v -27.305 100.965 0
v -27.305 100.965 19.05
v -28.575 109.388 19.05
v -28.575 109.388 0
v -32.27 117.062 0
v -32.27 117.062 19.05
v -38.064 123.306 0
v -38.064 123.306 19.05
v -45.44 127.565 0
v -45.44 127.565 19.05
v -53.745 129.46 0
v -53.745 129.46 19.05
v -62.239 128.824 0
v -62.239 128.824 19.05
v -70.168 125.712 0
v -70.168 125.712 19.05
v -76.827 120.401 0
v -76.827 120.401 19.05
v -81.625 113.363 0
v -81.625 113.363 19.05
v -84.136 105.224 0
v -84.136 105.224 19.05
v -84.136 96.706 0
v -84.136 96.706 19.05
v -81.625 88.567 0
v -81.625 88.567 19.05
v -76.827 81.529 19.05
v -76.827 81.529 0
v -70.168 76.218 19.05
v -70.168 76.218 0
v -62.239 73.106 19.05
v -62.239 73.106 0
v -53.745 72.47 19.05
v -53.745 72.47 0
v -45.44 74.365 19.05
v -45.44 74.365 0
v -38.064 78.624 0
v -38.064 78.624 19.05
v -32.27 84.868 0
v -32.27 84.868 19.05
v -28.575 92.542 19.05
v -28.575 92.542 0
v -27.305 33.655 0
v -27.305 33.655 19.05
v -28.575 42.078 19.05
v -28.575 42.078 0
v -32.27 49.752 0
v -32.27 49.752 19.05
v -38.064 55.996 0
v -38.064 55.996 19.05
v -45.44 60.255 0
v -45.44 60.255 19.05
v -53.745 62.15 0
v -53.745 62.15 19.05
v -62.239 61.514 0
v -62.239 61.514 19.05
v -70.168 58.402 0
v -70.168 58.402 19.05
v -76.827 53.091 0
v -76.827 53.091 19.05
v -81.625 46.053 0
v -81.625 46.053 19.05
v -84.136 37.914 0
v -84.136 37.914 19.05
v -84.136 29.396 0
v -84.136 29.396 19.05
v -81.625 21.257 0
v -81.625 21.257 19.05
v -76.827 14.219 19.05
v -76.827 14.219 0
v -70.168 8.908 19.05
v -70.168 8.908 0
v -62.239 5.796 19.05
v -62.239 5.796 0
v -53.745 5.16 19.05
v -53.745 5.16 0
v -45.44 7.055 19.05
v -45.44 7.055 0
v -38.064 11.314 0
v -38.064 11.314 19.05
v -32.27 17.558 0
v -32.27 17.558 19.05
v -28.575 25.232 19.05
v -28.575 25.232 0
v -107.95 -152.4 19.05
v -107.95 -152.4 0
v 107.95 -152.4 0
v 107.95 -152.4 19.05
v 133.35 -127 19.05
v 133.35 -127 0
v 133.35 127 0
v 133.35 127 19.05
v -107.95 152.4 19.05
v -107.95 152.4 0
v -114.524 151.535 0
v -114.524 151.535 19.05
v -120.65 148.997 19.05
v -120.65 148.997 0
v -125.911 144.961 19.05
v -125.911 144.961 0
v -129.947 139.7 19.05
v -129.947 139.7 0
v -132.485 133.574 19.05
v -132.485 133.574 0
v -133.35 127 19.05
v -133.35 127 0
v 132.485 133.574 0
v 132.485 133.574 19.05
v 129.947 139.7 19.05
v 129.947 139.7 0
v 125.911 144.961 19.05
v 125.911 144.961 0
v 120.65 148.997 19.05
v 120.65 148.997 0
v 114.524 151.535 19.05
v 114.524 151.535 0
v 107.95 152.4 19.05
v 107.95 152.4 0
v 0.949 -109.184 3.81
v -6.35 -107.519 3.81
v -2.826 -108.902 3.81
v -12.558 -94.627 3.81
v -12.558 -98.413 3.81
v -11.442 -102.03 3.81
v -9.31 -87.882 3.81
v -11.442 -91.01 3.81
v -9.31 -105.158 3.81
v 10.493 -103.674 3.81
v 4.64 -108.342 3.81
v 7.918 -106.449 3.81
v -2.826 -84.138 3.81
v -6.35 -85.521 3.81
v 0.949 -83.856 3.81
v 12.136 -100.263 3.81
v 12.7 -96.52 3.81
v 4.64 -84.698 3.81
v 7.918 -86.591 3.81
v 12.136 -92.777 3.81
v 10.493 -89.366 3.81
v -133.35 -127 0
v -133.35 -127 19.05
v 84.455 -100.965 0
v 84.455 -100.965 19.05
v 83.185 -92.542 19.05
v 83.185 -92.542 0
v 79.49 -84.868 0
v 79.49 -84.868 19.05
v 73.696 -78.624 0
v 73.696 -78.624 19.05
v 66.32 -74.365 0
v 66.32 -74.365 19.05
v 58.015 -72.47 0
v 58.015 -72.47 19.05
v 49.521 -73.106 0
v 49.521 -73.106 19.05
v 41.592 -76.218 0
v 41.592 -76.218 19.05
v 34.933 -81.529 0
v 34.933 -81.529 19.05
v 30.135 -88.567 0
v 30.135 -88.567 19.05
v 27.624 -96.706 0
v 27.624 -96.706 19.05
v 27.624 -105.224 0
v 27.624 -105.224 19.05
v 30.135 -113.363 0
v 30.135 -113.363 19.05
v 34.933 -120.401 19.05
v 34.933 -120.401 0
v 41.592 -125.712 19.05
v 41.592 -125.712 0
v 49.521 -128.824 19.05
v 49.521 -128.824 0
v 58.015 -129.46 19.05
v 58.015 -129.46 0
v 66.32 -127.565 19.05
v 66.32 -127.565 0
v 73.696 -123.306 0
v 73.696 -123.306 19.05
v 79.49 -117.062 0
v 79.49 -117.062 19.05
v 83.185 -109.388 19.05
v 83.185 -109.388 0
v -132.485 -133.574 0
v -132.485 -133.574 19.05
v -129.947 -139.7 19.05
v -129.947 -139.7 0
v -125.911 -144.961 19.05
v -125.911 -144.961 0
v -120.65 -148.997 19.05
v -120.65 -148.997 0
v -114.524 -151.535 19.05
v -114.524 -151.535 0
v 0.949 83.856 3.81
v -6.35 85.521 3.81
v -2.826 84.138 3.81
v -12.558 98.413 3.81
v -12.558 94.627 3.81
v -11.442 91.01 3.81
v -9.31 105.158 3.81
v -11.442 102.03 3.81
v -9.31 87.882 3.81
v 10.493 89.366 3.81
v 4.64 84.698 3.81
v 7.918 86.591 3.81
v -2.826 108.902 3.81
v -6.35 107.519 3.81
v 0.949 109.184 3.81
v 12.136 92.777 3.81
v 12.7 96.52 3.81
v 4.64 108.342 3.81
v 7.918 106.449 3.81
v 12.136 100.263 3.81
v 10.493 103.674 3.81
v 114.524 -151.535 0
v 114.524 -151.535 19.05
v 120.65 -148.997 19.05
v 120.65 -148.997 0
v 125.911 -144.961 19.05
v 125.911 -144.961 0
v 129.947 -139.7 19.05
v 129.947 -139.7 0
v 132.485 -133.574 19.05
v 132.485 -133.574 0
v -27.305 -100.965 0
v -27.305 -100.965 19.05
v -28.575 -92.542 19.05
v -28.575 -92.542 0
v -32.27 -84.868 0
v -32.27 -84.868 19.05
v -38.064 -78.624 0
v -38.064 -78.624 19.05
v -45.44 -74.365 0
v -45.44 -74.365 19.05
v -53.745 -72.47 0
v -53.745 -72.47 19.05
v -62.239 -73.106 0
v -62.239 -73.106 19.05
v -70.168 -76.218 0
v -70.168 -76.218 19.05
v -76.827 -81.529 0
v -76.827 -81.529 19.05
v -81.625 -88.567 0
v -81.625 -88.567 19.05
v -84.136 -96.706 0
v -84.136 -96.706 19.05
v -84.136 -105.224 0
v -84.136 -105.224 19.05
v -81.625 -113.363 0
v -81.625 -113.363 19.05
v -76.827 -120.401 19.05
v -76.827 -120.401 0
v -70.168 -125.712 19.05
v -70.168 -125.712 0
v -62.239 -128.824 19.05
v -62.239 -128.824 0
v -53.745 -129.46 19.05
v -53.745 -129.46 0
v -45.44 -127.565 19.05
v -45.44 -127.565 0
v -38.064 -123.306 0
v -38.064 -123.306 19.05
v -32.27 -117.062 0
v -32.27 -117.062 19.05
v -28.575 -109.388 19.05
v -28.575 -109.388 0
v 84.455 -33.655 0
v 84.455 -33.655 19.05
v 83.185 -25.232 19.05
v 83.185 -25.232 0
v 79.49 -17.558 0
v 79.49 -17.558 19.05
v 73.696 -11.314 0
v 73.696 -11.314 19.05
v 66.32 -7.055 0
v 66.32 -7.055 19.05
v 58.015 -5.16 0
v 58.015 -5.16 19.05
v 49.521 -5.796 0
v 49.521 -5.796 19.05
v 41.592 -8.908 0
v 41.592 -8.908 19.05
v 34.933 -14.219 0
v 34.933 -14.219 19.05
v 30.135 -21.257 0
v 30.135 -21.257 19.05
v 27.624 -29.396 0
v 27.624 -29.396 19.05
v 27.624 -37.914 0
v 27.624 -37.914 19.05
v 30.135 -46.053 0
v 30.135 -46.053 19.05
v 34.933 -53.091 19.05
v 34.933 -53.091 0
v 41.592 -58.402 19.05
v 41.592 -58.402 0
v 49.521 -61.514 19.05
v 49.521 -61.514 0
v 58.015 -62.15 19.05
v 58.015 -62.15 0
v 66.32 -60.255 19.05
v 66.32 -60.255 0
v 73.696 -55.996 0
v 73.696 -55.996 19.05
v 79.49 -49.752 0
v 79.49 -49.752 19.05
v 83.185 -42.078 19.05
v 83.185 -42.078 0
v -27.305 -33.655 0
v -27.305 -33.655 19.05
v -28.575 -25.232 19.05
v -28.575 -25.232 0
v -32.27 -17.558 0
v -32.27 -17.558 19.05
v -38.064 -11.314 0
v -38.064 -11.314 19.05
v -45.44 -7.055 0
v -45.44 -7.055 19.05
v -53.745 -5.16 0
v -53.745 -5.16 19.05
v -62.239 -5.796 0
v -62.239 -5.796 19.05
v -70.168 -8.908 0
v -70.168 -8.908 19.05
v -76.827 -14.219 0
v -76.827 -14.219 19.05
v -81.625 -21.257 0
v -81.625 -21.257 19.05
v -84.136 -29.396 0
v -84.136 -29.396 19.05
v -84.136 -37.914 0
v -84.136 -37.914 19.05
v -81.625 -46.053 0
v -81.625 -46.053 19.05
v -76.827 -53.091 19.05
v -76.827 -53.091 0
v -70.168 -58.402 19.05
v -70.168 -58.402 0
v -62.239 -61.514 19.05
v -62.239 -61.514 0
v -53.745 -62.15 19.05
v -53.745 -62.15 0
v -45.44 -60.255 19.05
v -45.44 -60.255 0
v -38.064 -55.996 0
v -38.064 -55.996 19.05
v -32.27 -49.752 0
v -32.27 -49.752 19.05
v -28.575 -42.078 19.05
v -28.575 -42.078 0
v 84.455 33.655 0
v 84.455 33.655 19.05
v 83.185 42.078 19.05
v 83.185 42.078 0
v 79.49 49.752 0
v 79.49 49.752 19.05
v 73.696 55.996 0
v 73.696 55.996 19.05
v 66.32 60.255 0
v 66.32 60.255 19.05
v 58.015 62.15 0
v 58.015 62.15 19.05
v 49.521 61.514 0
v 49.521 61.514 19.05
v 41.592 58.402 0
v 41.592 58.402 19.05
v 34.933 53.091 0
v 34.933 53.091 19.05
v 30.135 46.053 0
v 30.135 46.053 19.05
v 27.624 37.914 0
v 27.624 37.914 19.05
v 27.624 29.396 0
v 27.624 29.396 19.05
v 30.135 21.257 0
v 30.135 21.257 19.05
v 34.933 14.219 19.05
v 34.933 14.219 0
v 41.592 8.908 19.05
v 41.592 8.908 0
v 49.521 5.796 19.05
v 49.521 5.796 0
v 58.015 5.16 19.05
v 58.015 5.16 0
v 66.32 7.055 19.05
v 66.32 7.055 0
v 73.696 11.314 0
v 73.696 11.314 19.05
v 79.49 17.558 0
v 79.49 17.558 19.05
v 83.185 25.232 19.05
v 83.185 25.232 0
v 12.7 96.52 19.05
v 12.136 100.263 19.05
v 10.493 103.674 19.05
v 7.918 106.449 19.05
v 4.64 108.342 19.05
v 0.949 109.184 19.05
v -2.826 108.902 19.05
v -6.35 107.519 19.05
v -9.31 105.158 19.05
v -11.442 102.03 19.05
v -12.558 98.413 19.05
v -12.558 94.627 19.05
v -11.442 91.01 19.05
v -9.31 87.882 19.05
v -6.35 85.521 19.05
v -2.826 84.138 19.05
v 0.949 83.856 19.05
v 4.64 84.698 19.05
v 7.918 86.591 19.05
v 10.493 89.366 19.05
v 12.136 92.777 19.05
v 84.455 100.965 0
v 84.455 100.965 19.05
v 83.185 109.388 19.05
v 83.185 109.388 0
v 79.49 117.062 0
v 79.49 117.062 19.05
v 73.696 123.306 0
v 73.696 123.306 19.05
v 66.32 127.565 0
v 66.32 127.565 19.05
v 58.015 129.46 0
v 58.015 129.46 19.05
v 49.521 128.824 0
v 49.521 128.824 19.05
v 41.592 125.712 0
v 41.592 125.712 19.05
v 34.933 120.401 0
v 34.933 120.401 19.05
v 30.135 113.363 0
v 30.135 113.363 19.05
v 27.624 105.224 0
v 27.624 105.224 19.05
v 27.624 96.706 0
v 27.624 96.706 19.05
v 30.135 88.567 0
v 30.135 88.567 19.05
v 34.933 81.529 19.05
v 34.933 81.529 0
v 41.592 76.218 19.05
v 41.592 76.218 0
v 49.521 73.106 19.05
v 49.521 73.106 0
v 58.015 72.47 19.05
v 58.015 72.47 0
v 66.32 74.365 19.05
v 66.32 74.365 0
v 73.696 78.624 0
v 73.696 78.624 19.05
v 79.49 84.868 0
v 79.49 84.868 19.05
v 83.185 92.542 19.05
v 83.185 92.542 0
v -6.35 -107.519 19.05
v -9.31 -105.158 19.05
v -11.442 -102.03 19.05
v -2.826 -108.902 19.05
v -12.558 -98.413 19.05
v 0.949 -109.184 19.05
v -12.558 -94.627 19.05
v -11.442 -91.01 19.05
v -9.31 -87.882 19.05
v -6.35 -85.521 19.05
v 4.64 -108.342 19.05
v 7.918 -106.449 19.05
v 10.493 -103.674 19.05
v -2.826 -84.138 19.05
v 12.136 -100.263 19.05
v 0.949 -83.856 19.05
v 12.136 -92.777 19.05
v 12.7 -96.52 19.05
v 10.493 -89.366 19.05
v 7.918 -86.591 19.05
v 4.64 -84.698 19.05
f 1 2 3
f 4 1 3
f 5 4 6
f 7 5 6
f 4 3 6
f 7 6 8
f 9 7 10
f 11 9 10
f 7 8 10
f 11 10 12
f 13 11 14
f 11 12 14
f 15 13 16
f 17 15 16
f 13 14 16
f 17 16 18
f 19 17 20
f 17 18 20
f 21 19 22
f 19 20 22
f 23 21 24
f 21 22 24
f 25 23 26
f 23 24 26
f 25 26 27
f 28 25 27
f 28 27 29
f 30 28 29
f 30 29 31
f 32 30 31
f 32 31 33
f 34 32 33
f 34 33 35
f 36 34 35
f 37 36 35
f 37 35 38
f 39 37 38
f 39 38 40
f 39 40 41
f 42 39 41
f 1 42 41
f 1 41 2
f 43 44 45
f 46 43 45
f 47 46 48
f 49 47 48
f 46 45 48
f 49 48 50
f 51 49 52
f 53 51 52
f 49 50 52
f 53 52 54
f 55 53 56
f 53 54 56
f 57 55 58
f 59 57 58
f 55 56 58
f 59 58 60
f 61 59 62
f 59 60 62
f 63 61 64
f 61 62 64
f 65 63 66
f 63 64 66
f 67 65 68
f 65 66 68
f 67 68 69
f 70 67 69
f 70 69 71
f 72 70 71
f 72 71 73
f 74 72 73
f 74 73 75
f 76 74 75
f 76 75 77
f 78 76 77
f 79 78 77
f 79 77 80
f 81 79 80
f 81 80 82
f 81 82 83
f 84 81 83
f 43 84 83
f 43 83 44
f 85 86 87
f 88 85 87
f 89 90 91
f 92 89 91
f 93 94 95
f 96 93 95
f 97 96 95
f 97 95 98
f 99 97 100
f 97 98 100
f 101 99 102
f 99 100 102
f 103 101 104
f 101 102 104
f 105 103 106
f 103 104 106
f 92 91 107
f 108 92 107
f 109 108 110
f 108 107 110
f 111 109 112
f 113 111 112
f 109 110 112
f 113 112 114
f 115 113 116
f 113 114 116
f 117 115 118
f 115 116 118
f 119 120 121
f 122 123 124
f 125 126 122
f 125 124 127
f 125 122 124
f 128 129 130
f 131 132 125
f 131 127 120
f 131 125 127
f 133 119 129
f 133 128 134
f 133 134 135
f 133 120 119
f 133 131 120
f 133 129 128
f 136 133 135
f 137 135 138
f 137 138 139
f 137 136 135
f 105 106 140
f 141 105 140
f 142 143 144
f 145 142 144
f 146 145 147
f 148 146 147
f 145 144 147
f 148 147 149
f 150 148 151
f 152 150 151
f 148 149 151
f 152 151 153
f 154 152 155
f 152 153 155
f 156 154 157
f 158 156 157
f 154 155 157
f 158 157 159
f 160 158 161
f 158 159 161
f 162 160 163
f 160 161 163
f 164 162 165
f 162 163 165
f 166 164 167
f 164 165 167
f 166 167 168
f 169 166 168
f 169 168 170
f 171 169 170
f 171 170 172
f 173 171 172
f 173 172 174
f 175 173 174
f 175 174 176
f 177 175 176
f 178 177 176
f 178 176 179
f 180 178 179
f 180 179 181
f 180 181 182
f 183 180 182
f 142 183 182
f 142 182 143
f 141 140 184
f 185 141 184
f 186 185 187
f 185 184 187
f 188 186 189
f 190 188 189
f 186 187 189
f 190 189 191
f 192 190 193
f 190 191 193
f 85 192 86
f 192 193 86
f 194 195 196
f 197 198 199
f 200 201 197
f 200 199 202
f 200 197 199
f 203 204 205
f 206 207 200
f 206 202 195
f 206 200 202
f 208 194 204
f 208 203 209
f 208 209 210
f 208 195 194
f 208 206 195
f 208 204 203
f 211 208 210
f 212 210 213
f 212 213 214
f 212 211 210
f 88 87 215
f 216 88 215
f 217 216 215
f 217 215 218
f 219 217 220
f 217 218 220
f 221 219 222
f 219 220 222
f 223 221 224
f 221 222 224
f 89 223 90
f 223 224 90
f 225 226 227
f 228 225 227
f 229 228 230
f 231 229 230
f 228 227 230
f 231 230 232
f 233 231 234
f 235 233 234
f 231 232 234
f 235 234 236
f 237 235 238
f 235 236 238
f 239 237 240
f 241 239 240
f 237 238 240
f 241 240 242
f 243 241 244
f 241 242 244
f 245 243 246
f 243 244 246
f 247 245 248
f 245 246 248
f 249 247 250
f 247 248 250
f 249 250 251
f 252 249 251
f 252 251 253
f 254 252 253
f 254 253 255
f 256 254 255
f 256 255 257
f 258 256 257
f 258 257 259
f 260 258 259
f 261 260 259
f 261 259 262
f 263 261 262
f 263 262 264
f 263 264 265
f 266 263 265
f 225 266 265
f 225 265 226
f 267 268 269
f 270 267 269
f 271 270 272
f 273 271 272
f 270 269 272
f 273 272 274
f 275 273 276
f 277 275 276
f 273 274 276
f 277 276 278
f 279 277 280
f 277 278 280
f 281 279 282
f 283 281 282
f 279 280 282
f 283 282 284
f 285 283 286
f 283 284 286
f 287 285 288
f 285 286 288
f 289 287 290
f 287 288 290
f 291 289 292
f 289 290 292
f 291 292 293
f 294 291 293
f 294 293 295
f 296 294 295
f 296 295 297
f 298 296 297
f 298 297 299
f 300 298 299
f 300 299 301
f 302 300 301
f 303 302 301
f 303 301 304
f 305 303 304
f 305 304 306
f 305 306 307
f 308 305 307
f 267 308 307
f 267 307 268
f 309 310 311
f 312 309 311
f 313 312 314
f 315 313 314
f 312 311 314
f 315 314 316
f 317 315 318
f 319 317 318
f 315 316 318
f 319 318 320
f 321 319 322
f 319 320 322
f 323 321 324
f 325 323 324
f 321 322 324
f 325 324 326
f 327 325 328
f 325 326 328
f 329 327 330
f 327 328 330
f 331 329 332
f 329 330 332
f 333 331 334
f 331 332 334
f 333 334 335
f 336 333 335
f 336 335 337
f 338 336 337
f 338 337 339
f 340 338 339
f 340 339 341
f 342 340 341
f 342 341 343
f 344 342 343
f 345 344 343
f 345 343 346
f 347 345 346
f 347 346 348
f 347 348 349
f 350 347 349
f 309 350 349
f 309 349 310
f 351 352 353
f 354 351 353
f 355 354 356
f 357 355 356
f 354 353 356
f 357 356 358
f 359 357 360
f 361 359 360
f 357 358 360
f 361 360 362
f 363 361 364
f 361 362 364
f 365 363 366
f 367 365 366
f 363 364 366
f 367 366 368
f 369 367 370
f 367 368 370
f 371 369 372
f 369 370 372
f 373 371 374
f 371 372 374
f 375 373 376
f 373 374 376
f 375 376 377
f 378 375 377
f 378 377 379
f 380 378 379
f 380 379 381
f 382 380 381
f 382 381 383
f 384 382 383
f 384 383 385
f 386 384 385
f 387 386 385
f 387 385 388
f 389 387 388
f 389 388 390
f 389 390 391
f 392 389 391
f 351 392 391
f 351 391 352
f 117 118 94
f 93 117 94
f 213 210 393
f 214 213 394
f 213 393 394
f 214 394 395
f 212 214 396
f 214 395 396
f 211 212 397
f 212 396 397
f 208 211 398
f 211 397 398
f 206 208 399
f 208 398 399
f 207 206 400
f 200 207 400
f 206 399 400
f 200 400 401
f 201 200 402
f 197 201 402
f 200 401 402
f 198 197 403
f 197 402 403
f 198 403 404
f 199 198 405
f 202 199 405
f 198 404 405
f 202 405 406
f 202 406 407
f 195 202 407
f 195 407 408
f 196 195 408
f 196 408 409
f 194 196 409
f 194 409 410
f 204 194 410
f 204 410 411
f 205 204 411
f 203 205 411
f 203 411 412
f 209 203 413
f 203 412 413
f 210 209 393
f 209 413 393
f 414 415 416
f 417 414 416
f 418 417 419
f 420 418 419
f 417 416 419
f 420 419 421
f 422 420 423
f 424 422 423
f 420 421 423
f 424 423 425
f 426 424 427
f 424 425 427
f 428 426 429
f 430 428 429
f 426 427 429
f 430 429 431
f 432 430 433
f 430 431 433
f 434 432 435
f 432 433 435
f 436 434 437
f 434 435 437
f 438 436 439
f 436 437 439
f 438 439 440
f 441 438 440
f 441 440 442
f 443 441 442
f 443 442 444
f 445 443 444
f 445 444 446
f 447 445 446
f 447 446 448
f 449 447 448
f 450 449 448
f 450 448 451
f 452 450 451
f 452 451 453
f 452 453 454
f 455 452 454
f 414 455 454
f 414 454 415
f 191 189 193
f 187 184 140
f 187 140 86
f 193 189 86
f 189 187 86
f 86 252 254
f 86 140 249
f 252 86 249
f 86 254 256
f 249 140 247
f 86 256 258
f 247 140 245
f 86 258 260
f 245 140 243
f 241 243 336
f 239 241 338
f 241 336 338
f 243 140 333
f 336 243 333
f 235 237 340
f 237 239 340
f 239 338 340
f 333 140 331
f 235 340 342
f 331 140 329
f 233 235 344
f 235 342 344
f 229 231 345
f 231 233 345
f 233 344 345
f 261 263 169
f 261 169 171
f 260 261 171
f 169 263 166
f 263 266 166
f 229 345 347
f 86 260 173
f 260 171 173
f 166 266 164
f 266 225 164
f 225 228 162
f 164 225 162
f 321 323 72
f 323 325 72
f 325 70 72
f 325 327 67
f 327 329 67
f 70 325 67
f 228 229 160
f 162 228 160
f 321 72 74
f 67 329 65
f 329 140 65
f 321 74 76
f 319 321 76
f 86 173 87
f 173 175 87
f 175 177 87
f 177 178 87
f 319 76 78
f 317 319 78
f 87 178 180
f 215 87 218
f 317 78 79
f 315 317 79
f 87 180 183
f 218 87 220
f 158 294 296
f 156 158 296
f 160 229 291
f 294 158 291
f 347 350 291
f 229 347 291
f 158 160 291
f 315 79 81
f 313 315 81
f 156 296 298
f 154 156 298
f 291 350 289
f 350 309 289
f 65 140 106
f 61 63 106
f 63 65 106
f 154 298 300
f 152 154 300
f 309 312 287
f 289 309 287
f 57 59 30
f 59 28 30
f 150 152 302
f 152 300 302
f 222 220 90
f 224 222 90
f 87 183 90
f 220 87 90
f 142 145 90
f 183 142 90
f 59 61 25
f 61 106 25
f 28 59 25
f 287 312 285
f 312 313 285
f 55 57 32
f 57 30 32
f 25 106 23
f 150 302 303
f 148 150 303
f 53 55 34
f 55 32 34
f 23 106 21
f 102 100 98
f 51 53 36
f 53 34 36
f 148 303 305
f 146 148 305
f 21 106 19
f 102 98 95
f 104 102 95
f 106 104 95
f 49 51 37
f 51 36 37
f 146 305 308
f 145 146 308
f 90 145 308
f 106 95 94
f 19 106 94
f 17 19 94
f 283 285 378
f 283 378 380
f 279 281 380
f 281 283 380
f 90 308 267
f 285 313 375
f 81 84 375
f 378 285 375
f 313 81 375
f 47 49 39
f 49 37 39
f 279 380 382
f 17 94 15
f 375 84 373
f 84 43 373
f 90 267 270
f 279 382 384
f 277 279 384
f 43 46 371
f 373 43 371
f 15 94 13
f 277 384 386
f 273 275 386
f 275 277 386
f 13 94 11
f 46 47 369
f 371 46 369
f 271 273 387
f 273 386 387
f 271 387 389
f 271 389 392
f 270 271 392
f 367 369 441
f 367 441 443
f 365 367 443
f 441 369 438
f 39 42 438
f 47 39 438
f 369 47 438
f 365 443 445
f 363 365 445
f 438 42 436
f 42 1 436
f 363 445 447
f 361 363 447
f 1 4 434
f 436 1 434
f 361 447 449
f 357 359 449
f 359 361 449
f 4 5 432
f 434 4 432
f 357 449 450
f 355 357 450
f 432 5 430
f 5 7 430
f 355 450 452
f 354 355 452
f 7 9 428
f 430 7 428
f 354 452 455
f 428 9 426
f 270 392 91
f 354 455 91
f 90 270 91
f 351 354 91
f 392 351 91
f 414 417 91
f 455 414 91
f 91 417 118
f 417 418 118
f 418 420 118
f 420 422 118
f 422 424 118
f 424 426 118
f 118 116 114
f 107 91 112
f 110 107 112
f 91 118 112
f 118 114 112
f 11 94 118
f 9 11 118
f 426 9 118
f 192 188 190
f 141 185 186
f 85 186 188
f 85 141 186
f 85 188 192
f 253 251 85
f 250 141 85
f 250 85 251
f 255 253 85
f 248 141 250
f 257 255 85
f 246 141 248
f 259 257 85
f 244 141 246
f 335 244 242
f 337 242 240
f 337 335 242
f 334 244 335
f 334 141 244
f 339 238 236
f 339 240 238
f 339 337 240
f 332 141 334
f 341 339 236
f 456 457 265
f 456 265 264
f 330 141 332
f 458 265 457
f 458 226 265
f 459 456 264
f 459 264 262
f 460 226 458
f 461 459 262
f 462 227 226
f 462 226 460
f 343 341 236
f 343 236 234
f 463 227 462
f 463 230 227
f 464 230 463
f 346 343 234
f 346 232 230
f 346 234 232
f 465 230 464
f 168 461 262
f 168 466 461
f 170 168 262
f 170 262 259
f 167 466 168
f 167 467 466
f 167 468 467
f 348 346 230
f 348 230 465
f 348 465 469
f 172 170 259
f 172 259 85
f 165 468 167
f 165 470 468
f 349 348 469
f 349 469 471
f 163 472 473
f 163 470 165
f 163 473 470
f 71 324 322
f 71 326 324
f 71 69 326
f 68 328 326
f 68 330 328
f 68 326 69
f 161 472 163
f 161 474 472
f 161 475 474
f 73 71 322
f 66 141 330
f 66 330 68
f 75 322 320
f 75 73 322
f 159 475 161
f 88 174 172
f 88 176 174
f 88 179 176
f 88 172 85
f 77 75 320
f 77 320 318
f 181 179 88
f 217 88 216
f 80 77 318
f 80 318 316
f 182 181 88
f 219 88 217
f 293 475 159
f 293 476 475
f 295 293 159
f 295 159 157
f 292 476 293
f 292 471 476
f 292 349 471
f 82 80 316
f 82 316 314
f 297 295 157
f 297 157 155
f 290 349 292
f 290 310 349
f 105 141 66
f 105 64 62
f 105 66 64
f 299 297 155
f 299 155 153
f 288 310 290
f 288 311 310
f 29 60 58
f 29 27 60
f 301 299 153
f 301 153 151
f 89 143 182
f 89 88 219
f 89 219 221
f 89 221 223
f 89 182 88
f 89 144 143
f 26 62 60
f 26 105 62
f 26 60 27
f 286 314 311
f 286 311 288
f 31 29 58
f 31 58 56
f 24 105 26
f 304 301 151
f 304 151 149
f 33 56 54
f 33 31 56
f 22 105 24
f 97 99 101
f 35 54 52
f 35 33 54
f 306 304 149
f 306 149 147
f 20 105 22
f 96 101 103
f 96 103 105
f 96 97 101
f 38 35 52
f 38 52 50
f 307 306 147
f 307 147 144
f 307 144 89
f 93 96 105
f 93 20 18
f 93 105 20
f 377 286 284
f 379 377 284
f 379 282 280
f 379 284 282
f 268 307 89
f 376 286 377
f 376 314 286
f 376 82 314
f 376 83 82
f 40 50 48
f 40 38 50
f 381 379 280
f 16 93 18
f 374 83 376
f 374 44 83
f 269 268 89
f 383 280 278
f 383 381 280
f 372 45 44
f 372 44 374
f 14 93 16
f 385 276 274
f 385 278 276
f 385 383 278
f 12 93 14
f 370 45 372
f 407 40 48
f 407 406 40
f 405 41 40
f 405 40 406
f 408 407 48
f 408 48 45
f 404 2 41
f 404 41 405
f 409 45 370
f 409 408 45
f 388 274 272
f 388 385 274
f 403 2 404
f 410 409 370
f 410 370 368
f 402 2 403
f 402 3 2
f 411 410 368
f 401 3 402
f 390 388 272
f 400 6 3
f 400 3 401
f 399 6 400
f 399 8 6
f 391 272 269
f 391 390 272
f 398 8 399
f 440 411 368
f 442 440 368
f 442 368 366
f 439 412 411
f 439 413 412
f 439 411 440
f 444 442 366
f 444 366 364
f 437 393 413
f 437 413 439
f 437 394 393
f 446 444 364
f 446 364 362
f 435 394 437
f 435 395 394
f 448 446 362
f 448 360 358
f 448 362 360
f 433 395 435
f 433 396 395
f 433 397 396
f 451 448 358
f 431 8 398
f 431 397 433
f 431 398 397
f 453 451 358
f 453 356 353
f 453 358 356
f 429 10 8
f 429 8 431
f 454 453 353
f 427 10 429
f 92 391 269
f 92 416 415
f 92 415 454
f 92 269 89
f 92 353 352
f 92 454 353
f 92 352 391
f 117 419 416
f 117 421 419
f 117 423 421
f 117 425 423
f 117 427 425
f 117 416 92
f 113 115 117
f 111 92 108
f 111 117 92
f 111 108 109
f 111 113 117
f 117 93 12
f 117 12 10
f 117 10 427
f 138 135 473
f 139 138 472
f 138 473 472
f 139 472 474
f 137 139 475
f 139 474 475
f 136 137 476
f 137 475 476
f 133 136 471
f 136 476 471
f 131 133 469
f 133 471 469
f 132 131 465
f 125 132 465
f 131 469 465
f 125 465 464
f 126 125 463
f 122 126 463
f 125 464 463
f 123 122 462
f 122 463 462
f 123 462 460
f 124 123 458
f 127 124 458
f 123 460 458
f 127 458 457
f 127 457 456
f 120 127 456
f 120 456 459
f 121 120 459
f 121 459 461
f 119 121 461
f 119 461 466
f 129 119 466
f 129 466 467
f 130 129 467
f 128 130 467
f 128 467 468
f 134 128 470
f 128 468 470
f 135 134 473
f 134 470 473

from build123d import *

# Parameters (mm, degrees)
F1_DEPTH = 19.05
F2_R     = 28.575
F3_DEPTH = 19.051
F4_R     = 12.7
F5_DEPTH = 15.24


with BuildPart() as f1:
    # F0 (on Top) → F1 (new body)
    with BuildSketch(Plane.XY):
        with BuildLine():
            ThreePointArc((133.35, 127), (125.910512, 144.960512), (107.95, 152.4))
            Line((107.95, 152.4), (0, 152.4))
            Line((0, 152.4), (0, -152.4))
            Line((0, -152.4), (107.95, -152.4))
            ThreePointArc((107.95, -152.4), (125.910512, -144.960512), (133.35, -127))
            Line((133.35, -127), (133.35, 127))
        make_face()
        with BuildLine():
            Line((0, -152.4), (0, 152.4))
            Line((0, 152.4), (-107.95, 152.4))
            ThreePointArc((-107.95, 152.4), (-125.910512, 144.960512), (-133.35, 127))
            Line((-133.35, 127), (-133.35, -127))
            ThreePointArc((-133.35, -127), (-125.910512, -144.960512), (-107.95, -152.4))
            Line((-107.95, -152.4), (0, -152.4))
        make_face()
    extrude(amount=F1_DEPTH)

    # F2 (on face) → F3 (cut, through all)
    with BuildSketch(Plane.XY.offset(19.05)):
        with Locations((-55.88, 100.965)):
            Circle(F2_R)
        with Locations((-55.88, 33.655)):
            Circle(F2_R)
        with Locations((-55.88, -33.655)):
            Circle(F2_R)
        with Locations((-55.88, -100.965)):
            Circle(F2_R)
        with Locations((55.88, -100.965)):
            Circle(F2_R)
        with Locations((55.88, -33.655)):
            Circle(F2_R)
        with Locations((55.88, 33.655)):
            Circle(F2_R)
        with Locations((55.88, 100.965)):
            Circle(F2_R)
    extrude(amount=-F3_DEPTH, mode=Mode.SUBTRACT)

    # F4 (on face) → F5 (cut)
    with BuildSketch(Plane.XY.offset(19.05)):
        with Locations((0, 96.52)):
            Circle(F4_R)
        with Locations((0, -96.52)):
            Circle(F4_R)
    extrude(amount=-F5_DEPTH, mode=Mode.SUBTRACT)


solid = f1.part
